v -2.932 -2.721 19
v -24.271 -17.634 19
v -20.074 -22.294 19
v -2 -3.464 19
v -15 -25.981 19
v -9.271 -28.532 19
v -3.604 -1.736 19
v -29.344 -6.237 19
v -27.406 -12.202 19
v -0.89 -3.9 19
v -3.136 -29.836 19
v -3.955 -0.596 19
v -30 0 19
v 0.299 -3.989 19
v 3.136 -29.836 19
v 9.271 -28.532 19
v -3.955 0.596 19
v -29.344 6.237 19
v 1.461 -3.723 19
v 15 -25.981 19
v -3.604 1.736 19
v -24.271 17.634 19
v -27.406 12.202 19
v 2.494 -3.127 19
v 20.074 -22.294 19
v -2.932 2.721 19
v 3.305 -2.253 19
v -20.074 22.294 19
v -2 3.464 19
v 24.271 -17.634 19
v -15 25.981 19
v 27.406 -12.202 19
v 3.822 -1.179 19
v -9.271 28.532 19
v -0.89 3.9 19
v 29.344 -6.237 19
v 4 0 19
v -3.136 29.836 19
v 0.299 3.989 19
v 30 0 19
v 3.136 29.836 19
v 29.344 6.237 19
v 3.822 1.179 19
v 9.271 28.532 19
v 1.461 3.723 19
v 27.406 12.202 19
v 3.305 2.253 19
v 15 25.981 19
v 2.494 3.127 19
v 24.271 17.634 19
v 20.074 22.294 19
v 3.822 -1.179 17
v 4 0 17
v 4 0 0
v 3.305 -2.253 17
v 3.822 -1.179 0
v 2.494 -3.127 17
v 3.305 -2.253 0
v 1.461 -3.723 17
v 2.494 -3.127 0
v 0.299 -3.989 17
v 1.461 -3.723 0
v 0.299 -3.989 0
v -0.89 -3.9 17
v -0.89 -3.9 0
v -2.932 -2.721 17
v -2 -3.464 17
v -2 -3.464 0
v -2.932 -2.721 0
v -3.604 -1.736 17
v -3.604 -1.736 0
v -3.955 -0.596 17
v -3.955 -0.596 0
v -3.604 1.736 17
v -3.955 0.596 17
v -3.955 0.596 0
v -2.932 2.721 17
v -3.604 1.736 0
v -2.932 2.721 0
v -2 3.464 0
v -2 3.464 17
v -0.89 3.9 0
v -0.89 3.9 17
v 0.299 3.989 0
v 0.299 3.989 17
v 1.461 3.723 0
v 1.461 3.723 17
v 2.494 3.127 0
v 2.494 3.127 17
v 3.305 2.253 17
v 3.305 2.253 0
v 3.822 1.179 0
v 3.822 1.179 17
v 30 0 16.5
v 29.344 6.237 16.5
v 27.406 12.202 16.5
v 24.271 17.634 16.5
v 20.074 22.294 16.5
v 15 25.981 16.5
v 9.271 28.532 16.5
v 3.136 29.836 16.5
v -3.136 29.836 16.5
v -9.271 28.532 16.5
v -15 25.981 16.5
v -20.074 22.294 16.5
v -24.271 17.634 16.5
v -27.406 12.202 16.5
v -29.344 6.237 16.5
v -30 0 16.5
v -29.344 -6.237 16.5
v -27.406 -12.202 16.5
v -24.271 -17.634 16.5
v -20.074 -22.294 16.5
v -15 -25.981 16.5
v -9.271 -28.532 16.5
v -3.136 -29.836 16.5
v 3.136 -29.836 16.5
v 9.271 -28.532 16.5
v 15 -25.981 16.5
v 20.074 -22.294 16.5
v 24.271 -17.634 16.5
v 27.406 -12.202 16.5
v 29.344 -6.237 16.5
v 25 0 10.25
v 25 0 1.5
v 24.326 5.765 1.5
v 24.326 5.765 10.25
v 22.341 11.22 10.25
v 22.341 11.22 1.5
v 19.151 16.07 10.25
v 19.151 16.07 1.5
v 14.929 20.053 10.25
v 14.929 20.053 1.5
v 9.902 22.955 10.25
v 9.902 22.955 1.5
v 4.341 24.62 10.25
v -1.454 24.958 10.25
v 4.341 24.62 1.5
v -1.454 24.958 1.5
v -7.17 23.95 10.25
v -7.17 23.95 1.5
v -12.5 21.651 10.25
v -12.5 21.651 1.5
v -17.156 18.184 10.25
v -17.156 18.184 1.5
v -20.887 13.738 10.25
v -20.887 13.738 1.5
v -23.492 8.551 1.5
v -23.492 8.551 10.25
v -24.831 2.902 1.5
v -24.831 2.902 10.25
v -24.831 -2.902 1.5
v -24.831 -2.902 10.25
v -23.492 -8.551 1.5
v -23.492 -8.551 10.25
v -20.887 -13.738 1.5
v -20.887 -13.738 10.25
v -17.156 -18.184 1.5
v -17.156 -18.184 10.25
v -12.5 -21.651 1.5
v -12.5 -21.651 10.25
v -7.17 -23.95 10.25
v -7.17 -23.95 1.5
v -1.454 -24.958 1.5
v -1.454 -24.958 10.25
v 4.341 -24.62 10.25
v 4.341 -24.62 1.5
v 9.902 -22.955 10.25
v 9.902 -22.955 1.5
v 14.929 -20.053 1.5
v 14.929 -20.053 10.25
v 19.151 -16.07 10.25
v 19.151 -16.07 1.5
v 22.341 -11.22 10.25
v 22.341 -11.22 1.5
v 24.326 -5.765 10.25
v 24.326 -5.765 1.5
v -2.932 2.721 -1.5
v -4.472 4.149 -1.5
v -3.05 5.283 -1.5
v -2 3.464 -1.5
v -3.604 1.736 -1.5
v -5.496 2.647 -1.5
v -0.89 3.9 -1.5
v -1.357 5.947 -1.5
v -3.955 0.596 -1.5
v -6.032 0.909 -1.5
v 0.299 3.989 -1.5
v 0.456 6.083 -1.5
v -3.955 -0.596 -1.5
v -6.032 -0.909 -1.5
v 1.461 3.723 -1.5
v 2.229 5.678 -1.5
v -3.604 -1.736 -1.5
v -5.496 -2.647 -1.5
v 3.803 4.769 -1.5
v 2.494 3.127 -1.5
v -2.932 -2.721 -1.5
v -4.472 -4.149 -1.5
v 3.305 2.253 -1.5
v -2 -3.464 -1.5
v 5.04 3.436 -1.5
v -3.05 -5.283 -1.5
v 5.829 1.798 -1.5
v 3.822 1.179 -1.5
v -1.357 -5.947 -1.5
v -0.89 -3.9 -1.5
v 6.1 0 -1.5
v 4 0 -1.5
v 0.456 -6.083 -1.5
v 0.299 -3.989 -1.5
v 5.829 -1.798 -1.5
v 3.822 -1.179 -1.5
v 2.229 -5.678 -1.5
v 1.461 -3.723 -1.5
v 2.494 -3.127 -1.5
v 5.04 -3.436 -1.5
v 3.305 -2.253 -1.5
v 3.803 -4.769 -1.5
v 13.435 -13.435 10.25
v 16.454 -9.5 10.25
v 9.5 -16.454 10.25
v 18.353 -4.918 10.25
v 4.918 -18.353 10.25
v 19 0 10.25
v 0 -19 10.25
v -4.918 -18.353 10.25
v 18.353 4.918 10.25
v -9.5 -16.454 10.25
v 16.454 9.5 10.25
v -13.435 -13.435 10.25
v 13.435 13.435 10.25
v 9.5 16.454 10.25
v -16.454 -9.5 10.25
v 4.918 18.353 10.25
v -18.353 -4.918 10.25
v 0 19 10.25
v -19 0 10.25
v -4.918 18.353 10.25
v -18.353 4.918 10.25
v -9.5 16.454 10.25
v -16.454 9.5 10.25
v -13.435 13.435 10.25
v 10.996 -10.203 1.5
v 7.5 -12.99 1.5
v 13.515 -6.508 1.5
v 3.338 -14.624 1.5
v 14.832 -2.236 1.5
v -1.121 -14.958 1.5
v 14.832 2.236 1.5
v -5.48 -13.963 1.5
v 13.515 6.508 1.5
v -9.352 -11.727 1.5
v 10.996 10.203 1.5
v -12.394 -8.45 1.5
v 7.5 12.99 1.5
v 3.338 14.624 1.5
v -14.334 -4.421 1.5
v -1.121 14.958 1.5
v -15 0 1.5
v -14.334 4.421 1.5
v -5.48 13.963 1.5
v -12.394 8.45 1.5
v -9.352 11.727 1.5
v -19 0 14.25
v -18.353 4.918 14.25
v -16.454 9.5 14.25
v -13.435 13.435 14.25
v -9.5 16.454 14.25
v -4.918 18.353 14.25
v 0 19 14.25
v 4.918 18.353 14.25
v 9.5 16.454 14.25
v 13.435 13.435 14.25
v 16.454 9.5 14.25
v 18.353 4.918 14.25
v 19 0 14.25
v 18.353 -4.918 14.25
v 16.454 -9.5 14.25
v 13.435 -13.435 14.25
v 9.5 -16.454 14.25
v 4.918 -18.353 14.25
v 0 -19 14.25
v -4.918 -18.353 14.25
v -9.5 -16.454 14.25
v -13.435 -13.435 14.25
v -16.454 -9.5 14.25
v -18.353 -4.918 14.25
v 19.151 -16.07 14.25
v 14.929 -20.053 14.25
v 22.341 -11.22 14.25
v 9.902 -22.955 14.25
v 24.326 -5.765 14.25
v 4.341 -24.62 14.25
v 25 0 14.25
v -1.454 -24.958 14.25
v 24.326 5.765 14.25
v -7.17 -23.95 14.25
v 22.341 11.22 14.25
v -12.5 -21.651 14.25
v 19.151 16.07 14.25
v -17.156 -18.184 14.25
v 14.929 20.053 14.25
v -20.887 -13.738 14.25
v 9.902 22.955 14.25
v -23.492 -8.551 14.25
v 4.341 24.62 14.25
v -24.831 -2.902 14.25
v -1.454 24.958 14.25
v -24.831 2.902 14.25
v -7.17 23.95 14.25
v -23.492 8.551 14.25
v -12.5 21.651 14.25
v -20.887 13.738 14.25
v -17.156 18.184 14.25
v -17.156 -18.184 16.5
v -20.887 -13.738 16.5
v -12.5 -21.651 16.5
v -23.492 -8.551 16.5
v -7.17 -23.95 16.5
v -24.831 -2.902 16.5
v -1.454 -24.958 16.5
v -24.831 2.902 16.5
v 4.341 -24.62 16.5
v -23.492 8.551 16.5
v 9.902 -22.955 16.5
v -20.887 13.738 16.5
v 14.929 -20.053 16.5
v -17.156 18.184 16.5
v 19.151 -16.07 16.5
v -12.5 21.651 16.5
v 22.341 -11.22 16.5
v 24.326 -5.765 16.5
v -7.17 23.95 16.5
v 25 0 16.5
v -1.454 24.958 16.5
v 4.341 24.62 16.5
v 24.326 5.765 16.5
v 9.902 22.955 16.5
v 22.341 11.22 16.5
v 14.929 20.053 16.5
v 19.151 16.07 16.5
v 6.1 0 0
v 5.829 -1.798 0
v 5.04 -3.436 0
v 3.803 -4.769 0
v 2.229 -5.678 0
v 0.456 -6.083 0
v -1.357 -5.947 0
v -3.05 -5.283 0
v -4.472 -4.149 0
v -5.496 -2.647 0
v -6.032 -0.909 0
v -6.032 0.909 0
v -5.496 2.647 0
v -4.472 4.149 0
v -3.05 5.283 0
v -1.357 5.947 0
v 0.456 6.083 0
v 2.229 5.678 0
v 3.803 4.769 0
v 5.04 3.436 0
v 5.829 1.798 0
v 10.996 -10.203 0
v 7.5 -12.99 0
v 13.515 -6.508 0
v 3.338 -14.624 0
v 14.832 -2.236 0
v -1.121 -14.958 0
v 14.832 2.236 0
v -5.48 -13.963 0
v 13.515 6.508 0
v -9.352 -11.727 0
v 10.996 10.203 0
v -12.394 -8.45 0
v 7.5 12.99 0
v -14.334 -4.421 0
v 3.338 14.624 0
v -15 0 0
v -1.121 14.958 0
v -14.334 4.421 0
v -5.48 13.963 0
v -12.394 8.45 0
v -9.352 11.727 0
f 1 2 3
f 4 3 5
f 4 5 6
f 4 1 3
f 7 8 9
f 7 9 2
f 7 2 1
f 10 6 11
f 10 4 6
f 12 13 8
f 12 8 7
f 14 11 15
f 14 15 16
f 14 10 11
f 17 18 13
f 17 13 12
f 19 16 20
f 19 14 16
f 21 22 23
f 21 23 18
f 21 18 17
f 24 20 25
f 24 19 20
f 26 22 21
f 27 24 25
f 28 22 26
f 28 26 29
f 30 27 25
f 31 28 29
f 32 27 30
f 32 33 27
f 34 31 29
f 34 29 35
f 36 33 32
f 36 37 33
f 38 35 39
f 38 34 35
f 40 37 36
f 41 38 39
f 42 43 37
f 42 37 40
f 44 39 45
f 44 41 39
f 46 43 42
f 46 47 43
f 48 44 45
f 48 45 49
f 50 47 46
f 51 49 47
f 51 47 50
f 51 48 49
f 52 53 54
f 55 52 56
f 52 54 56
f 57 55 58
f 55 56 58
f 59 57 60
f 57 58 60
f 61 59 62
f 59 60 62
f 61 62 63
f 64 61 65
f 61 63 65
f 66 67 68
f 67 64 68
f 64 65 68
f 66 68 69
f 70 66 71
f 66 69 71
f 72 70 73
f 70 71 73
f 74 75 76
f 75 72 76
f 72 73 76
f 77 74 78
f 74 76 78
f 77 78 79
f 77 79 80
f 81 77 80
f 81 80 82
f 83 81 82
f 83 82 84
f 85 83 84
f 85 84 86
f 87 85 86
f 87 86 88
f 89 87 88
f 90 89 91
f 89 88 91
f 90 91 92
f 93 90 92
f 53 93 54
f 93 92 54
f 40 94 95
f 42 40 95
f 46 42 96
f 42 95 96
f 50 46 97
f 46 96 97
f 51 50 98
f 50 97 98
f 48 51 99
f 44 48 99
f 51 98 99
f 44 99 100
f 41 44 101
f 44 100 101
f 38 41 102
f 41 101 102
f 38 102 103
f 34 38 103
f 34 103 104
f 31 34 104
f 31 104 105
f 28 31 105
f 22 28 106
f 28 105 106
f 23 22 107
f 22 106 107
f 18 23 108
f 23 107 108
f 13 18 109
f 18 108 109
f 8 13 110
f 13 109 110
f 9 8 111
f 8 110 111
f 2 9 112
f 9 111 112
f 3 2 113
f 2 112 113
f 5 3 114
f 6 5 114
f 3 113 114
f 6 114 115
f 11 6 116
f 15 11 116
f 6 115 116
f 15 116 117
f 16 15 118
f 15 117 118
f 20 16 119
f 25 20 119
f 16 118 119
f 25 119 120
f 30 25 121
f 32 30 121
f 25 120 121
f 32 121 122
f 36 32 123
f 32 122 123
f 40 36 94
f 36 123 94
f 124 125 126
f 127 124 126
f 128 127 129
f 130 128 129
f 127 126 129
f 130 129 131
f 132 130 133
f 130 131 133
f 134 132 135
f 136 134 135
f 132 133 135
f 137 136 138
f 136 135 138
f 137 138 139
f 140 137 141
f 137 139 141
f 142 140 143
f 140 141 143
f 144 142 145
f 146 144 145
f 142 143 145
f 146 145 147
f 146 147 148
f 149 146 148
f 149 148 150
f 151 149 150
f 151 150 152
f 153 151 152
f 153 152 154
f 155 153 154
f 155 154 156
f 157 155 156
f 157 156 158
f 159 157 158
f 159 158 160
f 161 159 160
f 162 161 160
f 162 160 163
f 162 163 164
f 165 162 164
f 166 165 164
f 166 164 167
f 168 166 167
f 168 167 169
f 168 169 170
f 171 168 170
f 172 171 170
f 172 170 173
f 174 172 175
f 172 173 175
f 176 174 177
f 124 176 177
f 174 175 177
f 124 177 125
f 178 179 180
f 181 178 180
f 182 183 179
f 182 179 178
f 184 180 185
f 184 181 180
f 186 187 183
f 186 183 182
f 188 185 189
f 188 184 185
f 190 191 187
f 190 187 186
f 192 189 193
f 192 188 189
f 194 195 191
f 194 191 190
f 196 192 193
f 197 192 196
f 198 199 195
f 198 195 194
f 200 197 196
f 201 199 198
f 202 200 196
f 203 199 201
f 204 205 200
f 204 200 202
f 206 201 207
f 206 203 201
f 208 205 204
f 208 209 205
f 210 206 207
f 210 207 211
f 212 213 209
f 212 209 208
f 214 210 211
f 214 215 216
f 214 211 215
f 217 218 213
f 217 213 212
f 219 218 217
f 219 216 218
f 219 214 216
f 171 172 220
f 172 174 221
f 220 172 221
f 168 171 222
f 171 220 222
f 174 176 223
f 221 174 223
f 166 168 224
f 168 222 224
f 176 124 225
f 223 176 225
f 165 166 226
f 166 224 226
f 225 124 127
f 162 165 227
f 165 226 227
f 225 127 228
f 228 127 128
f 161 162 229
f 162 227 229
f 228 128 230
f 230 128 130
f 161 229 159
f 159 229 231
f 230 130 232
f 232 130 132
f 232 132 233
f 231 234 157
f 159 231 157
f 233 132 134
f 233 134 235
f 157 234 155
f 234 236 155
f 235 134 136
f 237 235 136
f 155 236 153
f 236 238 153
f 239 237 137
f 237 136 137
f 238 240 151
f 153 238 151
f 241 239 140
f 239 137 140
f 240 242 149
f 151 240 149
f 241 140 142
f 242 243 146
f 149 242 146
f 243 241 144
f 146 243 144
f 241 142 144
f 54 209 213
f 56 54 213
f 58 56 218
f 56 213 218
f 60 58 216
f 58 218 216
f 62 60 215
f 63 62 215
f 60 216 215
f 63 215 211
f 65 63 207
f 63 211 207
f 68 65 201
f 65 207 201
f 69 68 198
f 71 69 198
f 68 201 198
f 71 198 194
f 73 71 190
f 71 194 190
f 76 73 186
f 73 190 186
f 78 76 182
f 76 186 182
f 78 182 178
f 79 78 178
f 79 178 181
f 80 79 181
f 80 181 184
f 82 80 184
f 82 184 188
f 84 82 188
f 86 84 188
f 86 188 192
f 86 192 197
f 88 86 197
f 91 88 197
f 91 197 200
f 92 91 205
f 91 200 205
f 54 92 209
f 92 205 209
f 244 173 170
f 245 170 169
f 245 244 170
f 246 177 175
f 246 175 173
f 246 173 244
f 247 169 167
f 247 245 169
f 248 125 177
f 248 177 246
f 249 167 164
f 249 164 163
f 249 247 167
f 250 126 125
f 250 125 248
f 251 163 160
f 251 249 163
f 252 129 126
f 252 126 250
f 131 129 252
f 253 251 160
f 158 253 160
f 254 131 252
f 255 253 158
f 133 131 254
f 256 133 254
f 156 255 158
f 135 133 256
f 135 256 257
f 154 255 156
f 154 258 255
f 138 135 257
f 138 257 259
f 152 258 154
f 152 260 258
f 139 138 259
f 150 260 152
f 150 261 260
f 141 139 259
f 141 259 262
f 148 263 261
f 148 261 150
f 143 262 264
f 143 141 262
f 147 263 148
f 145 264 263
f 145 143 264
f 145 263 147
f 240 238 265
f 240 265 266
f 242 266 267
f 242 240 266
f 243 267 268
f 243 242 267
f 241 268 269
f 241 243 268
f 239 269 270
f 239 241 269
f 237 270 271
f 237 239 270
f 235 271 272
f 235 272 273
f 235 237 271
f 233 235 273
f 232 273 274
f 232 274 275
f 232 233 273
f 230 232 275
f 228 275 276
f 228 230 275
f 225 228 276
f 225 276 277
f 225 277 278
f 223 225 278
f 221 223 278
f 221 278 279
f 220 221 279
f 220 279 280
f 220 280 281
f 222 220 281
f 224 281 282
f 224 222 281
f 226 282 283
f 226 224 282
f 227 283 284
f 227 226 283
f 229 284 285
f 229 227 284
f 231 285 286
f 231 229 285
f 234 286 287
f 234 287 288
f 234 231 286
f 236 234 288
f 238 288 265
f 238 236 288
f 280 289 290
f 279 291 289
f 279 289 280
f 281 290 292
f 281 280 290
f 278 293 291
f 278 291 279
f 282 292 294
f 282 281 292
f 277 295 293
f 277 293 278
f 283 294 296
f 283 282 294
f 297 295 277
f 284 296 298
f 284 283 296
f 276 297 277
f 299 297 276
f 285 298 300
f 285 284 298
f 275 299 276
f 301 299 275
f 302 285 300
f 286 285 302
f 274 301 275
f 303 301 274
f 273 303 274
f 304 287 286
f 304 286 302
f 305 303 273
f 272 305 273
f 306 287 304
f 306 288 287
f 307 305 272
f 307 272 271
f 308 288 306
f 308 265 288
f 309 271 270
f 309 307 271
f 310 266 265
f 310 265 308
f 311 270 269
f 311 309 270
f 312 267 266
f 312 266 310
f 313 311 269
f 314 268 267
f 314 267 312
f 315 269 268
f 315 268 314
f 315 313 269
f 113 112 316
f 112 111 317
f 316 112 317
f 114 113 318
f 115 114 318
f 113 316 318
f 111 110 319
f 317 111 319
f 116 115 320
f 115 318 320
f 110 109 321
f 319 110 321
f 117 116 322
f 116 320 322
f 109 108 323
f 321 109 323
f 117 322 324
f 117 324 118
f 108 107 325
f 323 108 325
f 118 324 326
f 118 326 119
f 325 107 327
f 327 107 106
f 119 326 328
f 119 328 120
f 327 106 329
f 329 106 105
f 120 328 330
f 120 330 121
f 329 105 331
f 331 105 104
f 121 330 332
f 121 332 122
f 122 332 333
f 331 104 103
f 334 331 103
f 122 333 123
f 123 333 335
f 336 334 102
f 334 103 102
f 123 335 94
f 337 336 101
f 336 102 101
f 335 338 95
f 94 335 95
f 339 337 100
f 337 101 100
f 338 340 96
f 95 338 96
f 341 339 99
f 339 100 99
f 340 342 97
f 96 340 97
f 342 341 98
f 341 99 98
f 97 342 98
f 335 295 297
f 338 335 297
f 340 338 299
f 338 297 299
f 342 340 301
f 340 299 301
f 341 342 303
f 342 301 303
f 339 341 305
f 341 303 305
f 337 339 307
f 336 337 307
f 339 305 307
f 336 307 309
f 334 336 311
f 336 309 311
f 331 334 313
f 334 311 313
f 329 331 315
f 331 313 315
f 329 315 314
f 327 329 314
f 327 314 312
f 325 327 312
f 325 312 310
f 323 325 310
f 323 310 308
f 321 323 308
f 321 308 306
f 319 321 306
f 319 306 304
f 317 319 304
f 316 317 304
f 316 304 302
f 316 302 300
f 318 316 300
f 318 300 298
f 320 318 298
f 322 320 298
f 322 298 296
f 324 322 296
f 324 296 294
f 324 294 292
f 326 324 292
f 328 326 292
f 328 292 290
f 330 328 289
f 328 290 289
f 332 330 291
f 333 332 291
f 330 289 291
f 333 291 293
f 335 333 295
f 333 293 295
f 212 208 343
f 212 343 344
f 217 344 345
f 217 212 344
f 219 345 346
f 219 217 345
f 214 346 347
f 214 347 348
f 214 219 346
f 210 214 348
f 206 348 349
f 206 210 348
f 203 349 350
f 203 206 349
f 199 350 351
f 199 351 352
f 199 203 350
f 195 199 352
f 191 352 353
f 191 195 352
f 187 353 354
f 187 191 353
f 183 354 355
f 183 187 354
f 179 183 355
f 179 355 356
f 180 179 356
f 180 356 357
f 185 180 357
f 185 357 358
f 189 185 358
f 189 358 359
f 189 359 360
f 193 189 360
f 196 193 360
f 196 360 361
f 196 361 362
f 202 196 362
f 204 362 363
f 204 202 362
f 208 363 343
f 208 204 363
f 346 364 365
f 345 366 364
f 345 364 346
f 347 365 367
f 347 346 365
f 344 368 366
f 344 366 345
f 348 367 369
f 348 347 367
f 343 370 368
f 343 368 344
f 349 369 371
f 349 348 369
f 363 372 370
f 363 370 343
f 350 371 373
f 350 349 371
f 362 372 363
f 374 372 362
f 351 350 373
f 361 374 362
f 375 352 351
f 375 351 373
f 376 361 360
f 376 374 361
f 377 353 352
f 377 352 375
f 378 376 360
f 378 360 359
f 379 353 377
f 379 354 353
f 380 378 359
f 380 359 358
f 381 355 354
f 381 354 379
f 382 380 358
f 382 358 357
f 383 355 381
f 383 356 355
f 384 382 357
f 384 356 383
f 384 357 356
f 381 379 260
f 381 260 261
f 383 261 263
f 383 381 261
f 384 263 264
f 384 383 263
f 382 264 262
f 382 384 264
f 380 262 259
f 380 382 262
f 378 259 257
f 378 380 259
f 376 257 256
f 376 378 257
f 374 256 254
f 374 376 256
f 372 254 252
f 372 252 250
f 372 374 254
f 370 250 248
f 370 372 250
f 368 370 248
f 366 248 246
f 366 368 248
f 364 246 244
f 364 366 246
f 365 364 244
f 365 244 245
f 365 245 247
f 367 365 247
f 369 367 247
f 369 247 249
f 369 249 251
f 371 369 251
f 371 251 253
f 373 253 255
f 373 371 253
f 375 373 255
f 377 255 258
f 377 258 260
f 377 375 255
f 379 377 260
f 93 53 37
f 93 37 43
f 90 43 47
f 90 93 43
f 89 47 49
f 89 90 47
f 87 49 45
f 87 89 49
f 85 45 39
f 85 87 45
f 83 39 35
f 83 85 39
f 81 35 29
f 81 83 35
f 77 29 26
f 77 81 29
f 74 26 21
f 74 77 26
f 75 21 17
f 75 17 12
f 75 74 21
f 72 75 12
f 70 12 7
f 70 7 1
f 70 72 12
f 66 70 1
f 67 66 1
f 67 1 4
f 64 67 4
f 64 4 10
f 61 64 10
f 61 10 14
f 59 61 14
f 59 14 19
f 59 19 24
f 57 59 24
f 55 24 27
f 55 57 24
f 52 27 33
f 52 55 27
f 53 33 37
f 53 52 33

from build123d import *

# Parameters (mm, degrees)
CROQUIS1_R              = 25
CROQUIS1_R_2            = 11
SALIENTE_EXTRUIR1_DEPTH = 19
CROQUIS3_R              = 11
CROQUIS3_R_2            = 9.5
SALIENTE_EXTRUIR2_DEPTH = 13
SALIENTE_EXTRUIR3_START = -2
CROQUIS4_R              = 11
CROQUIS4_R_2            = 4
SALIENTE_EXTRUIR3_DEPTH = 2
SALIENTE_EXTRUIR4_START = -2.5
CROQUIS5_R              = 30
CROQUIS5_R_2            = 25
SALIENTE_EXTRUIR4_DEPTH = 2.5
CORTAR_EXTRUIR1_START   = 4
CROQUIS6_R              = 25
CROQUIS6_R_2            = 19
CORTAR_EXTRUIR1_DEPTH   = 4
SALIENTE_EXTRUIR5_REACH = 48.487
CROQUIS7_R              = 11
CROQUIS7_R_2            = 4
SALIENTE_EXTRUIR6_START = 1.5
CROQUIS8_R              = 6.1
CROQUIS8_R_2            = 4
SALIENTE_EXTRUIR6_DEPTH = 1.5
CROQUIS9_R              = 25
CROQUIS9_R_2            = 15
CORTAR_EXTRUIR2_DEPTH   = 1.5


with BuildPart() as part:
    # Croquis1 → Saliente-Extruir1 (new body)
    with BuildSketch(Plane.XY):
        Circle(CROQUIS1_R)
        Circle(CROQUIS1_R_2, mode=Mode.SUBTRACT)
    extrude(amount=SALIENTE_EXTRUIR1_DEPTH)

    # Croquis3 → Saliente-Extruir2 (add, through all)
    with BuildSketch(Plane(origin=(0, 0, 6), x_dir=(-1, 0, 0), z_dir=(0, 0, -1))):
        Circle(CROQUIS3_R)
        Circle(CROQUIS3_R_2, mode=Mode.SUBTRACT)
    extrude(amount=-SALIENTE_EXTRUIR2_DEPTH)

    # Croquis4 → Saliente-Extruir3 (add)
    with BuildSketch(Plane.XY.offset(19).offset(SALIENTE_EXTRUIR3_START)):
        with Locations(Location((0, 0, 0), (0, 0, 180))):
            Circle(CROQUIS4_R)
        Circle(CROQUIS4_R_2, mode=Mode.SUBTRACT)
    extrude(amount=SALIENTE_EXTRUIR3_DEPTH)

    # Croquis5 → Saliente-Extruir4 (add)
    with BuildSketch(Plane.XY.offset(19).offset(SALIENTE_EXTRUIR4_START)):
        Circle(CROQUIS5_R)
        Circle(CROQUIS5_R_2, mode=Mode.SUBTRACT)
    extrude(amount=SALIENTE_EXTRUIR4_DEPTH)

    # Croquis6 → Cortar-Extruir1 (cut)
    with BuildSketch(Plane(origin=(0, 0, 14.25), x_dir=(-1, 0, 0), z_dir=(0, 0, -1)).offset(CORTAR_EXTRUIR1_START)):
        Circle(CROQUIS6_R)
        Circle(CROQUIS6_R_2, mode=Mode.SUBTRACT)
    extrude(amount=-CORTAR_EXTRUIR1_DEPTH, mode=Mode.SUBTRACT)

    # Croquis7 → Saliente-Extruir5 (add, up to next)
    with BuildSketch(Plane(origin=(0, 0, 0), x_dir=(-1, 0, 0), z_dir=(0, 0, -1)), mode=Mode.PRIVATE) as saliente_extruir5_sk1:
        Circle(CROQUIS7_R)
        with Locations(Location((0, 0, 0), (0, 0, 180))):
            Circle(CROQUIS7_R_2, mode=Mode.SUBTRACT)
    saliente_extruir5_tool1 = extrude(saliente_extruir5_sk1.sketch, amount=-SALIENTE_EXTRUIR5_REACH, mode=Mode.PRIVATE) - part.part
    add(saliente_extruir5_tool1.solids().sort_by_distance((10.688873, 0, 0))[0])

    # Croquis8 → Saliente-Extruir6 (add)
    with BuildSketch(Plane(origin=(0, 0, 0), x_dir=(-1, 0, 0), z_dir=(0, 0, -1)).offset(SALIENTE_EXTRUIR6_START)):
        with Locations(Location((0, 0, 0), (0, 0, 180))):
            Circle(CROQUIS8_R)
        with Locations(Location((0, 0, 0), (0, 0, 180))):
            Circle(CROQUIS8_R_2, mode=Mode.SUBTRACT)
    extrude(amount=-SALIENTE_EXTRUIR6_DEPTH)

    # Croquis9 → Cortar-Extruir2 (cut)
    with BuildSketch(Plane(origin=(0, 0, 0), x_dir=(-1, 0, 0), z_dir=(0, 0, -1))):
        Circle(CROQUIS9_R)
        Circle(CROQUIS9_R_2, mode=Mode.SUBTRACT)
    extrude(amount=-CORTAR_EXTRUIR2_DEPTH, mode=Mode.SUBTRACT)


solid = part.part
